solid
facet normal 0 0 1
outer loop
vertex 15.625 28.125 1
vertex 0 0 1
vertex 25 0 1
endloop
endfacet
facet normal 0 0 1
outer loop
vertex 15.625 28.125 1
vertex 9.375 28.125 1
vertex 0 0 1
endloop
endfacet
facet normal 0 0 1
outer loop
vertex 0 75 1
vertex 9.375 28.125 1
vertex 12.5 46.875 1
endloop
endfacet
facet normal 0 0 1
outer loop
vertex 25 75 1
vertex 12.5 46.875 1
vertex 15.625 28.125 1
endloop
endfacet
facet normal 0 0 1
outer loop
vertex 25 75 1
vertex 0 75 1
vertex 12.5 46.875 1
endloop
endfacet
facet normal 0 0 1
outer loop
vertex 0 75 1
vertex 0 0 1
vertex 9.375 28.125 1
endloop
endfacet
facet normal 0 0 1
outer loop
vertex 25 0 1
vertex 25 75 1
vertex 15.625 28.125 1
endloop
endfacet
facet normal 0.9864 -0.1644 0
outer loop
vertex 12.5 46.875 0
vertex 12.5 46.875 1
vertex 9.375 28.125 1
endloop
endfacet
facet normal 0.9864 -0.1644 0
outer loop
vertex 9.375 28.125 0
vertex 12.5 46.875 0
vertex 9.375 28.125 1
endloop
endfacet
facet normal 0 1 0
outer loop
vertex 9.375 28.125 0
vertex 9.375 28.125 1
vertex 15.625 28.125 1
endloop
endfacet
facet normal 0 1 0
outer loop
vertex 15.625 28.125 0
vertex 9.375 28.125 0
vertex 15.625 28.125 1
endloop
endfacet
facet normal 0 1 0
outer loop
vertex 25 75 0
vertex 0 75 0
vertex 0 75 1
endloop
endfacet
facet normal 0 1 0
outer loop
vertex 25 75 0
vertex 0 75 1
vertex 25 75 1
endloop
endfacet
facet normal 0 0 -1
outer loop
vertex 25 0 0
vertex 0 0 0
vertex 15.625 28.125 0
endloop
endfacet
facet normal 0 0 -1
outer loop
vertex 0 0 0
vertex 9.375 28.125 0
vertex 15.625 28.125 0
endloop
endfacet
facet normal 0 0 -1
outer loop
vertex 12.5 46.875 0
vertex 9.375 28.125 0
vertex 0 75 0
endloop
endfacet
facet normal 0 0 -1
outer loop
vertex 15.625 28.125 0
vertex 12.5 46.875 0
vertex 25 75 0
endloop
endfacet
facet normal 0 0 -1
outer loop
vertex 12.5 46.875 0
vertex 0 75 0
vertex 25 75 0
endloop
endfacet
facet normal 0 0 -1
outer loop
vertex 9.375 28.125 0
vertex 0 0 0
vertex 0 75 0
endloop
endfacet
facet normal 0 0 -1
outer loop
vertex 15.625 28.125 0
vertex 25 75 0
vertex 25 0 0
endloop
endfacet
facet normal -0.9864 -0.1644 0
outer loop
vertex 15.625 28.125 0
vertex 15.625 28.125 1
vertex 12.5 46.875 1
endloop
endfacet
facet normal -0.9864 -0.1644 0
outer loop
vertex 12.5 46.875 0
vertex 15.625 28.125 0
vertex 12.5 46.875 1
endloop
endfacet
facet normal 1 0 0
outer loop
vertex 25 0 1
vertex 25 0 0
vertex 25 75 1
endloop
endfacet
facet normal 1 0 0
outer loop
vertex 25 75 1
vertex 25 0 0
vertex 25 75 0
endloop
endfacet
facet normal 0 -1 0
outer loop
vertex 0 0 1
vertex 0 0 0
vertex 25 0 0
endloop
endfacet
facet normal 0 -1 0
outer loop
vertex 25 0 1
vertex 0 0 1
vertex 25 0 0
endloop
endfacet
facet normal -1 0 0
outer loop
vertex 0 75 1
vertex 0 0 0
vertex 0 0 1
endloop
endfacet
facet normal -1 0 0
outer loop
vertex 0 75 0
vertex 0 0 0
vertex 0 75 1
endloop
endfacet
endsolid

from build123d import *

# Parameters (mm, degrees)
PAD002_DEPTH      = 2
PAD002_DEPTH_BACK = 2
SKETCH_W          = 25
SKETCH_H          = 75
PAD_DEPTH         = 1


with BuildPart() as body002:
    # Sketch003 → Pad002 (new body, two sides)
    with BuildSketch(Plane.XY) as pad002_sk:
        Polygon((12.5, 46.875), (9.375, 28.125), (15.625, 28.125), align=None)
    extrude(amount=PAD002_DEPTH)
    extrude(pad002_sk.sketch, amount=-PAD002_DEPTH_BACK)


with BuildPart() as body:
    # Sketch → Pad (new body)
    with BuildSketch(Plane.XY):
        with Locations((12.5, 37.5)):
            Rectangle(SKETCH_W, SKETCH_H)
    extrude(amount=PAD_DEPTH)

    # Boolean: cut Body002
    add(body002.part, mode=Mode.SUBTRACT)


solid = body.part
